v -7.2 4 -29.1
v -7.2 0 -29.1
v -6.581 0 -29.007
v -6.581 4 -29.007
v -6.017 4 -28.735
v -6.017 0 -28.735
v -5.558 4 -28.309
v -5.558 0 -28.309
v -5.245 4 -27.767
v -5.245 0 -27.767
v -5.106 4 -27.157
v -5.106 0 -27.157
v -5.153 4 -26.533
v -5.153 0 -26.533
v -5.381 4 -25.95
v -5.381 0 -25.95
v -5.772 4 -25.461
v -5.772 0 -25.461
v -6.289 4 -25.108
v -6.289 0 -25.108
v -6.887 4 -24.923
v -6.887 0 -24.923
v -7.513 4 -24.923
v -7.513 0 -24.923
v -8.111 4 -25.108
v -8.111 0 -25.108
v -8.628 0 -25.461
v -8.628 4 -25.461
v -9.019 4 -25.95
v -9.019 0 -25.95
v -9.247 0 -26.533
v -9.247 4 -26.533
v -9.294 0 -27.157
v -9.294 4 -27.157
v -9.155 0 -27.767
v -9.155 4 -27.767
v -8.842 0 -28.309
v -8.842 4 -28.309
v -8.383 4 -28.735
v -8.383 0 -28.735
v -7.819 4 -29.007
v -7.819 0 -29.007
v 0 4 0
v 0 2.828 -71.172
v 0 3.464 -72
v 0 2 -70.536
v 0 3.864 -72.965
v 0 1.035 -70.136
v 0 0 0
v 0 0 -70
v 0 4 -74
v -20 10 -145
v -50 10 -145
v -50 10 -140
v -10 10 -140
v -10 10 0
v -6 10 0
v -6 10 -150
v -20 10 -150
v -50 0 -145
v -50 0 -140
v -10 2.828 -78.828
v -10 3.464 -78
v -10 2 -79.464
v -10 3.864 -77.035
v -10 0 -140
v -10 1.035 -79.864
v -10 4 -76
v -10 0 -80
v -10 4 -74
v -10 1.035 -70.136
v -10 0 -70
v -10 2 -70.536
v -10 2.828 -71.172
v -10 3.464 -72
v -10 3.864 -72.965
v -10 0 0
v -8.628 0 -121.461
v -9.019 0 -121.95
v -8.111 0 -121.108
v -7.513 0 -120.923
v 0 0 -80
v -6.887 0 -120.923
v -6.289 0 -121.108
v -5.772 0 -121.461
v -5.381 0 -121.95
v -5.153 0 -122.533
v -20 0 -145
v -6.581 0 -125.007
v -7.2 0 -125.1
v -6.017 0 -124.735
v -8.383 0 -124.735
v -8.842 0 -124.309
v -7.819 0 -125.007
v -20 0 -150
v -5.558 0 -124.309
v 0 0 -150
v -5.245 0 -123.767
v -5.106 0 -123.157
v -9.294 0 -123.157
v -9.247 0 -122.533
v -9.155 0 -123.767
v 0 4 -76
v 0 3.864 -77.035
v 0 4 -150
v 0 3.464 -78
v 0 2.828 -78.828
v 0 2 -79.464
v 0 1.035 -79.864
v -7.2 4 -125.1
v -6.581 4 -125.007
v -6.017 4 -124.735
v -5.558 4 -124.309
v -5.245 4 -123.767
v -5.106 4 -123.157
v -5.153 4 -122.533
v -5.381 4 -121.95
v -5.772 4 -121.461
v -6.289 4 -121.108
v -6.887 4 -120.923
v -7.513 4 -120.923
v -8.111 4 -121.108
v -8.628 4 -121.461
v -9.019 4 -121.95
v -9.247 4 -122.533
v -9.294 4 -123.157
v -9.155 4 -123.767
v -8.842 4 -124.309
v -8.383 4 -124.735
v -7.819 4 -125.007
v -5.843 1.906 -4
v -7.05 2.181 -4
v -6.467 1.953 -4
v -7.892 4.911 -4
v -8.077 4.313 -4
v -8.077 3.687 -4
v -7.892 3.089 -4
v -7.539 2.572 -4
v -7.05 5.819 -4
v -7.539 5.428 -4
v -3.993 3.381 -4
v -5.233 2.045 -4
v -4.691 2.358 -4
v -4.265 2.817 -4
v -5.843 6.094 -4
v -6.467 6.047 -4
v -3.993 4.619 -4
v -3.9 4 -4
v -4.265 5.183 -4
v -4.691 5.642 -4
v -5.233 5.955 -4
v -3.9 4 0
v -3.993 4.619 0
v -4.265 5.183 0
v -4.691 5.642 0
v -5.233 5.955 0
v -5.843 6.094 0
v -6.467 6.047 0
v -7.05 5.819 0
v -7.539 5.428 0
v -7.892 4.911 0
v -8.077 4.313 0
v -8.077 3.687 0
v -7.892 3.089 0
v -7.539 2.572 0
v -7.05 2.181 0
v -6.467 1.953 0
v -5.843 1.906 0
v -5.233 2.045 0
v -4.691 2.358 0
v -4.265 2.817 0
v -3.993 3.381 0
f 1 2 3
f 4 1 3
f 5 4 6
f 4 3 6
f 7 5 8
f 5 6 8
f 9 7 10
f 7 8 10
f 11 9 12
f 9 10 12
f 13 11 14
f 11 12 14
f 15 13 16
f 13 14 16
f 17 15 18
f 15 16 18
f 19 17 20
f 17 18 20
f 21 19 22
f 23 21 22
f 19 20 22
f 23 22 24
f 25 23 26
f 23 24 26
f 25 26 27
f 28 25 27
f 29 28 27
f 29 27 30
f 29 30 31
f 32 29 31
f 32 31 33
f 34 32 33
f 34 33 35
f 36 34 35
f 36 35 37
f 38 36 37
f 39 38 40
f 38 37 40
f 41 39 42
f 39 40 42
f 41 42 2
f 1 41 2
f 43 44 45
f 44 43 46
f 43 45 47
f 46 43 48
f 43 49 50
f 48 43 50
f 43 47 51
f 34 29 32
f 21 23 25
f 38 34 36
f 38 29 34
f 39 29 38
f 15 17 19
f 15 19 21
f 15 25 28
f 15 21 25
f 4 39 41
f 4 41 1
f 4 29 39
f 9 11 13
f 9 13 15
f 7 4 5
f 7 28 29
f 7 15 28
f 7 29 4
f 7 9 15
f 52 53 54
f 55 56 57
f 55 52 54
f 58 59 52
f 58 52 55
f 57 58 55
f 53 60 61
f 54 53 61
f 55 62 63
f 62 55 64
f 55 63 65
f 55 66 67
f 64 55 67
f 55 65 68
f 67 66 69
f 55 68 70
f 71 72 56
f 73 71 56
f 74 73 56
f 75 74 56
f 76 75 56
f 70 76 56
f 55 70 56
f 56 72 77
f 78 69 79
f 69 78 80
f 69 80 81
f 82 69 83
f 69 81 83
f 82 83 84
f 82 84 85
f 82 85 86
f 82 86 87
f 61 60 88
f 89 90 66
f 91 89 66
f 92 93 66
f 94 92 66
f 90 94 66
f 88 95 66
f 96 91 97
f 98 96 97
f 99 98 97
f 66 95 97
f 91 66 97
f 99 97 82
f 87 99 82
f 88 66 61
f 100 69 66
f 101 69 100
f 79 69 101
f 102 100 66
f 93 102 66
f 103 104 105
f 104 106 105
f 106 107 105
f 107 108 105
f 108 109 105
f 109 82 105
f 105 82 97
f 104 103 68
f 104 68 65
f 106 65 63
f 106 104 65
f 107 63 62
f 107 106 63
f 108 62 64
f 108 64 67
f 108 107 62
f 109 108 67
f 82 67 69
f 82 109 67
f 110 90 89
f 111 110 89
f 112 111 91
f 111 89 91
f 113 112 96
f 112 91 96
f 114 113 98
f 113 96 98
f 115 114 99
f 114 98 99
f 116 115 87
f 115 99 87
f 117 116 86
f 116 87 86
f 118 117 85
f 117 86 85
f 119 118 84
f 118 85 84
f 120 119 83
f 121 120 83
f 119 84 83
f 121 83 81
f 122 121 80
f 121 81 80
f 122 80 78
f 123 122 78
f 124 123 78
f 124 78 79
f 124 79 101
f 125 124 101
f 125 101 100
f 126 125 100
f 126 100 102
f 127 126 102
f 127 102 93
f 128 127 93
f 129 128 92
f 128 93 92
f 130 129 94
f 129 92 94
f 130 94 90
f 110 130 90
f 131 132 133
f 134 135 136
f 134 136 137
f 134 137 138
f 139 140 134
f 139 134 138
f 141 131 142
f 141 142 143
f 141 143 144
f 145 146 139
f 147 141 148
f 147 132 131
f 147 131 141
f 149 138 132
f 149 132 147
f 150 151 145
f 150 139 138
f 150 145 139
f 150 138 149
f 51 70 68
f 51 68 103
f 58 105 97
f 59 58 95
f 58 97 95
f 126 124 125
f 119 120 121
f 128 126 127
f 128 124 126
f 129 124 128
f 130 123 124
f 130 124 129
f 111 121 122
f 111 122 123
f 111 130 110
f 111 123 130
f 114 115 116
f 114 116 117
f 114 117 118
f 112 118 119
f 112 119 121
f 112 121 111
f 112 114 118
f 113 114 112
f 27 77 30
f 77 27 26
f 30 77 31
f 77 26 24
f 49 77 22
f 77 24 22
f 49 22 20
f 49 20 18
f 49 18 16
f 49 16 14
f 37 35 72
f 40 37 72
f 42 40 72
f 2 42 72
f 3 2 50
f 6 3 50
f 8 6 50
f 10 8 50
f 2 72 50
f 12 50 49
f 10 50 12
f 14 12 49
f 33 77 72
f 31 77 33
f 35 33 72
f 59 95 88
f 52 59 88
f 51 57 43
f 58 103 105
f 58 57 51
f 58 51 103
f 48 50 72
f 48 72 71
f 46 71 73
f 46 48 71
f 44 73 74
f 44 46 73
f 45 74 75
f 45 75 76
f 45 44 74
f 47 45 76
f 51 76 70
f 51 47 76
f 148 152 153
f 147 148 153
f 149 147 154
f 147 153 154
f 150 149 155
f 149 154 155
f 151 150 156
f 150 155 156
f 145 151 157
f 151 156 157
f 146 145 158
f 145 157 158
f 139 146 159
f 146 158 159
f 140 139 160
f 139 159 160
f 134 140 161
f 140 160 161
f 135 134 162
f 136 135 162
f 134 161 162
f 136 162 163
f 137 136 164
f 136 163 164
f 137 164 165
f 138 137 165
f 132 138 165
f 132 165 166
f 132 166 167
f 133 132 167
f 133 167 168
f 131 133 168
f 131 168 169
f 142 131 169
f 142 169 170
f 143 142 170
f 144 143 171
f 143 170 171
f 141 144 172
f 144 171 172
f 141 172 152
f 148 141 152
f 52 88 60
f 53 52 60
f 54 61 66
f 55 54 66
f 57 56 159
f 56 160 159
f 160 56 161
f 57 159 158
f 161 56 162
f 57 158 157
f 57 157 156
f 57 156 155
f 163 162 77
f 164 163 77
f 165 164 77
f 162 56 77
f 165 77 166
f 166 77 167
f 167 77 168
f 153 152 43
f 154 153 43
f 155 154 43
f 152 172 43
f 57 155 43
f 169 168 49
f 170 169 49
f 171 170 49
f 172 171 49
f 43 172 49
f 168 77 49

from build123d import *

# Parameters (mm, degrees)
DODANIE_WYCI_GNI_CIE1_DEPTH = 10
SZKIC2_R                    = 2.1
WYTNIJ_WYCI_GNI_CIE1_DEPTH  = 4
SZKIC3_R                    = 2.1
WYTNIJ_WYCI_GNI_CIE2_DEPTH  = 4
SFAZOWANIE1_SIZE            = 6
SZKIC4_W                    = 10
SZKIC4_H                    = 10
WYTNIJ_WYCI_GNI_CIE3_DEPTH  = 4
ZAOKR_GLENIE1_R             = 4


with BuildPart() as part:
    # Szkic1 → Dodanie-wyciągnięcie1 (new body)
    with BuildSketch(Plane(origin=(0, 0, 0), x_dir=(1, 0, 0), z_dir=(0, 1, 0))):
        Polygon((0, 0), (0, 150), (-20, 150), (-20, 145), (-50, 145), (-50, 140), (-10, 140), (-10, 0), align=None)
    extrude(amount=DODANIE_WYCI_GNI_CIE1_DEPTH)

    # Szkic2 → Wytnij-wyciągnięcie1 (cut)
    with BuildSketch(Plane.XZ):
        with Locations(Location((-7.2, -123, 0), (0, 0, 270))):
            Circle(SZKIC2_R)
        with Locations(Location((-7.2, -27, 0), (0, 0, 270))):
            Circle(SZKIC2_R)
    extrude(amount=-WYTNIJ_WYCI_GNI_CIE1_DEPTH, mode=Mode.SUBTRACT)

    # Szkic3 → Wytnij-wyciągnięcie2 (cut)
    with BuildSketch(Plane.XY):
        with Locations((-6, 4)):
            Circle(SZKIC3_R)
    extrude(amount=-WYTNIJ_WYCI_GNI_CIE2_DEPTH, mode=Mode.SUBTRACT)

    # Sfazowanie1
    sfazowanie1_edges = [part.edges().sort_by_distance(p)[0] for p in [
        (0, 10, -75),
    ]]
    chamfer(sfazowanie1_edges, length=SFAZOWANIE1_SIZE)

    # Szkic4 → Wytnij-wyciągnięcie3 (cut)
    with BuildSketch(Plane.XZ):
        with Locations((-5, -75)):
            Rectangle(SZKIC4_W, SZKIC4_H)
    extrude(amount=-WYTNIJ_WYCI_GNI_CIE3_DEPTH, mode=Mode.SUBTRACT)

    # Zaokrąglenie1
    zaokr_glenie1_edges = [part.edges().sort_by_distance(p)[0] for p in [
        (-5, 4, -80),
        (-5, 4, -70),
    ]]
    fillet(zaokr_glenie1_edges, radius=ZAOKR_GLENIE1_R - 0.0001)  # a hair under: the kernel refuses the full size


solid = part.part
